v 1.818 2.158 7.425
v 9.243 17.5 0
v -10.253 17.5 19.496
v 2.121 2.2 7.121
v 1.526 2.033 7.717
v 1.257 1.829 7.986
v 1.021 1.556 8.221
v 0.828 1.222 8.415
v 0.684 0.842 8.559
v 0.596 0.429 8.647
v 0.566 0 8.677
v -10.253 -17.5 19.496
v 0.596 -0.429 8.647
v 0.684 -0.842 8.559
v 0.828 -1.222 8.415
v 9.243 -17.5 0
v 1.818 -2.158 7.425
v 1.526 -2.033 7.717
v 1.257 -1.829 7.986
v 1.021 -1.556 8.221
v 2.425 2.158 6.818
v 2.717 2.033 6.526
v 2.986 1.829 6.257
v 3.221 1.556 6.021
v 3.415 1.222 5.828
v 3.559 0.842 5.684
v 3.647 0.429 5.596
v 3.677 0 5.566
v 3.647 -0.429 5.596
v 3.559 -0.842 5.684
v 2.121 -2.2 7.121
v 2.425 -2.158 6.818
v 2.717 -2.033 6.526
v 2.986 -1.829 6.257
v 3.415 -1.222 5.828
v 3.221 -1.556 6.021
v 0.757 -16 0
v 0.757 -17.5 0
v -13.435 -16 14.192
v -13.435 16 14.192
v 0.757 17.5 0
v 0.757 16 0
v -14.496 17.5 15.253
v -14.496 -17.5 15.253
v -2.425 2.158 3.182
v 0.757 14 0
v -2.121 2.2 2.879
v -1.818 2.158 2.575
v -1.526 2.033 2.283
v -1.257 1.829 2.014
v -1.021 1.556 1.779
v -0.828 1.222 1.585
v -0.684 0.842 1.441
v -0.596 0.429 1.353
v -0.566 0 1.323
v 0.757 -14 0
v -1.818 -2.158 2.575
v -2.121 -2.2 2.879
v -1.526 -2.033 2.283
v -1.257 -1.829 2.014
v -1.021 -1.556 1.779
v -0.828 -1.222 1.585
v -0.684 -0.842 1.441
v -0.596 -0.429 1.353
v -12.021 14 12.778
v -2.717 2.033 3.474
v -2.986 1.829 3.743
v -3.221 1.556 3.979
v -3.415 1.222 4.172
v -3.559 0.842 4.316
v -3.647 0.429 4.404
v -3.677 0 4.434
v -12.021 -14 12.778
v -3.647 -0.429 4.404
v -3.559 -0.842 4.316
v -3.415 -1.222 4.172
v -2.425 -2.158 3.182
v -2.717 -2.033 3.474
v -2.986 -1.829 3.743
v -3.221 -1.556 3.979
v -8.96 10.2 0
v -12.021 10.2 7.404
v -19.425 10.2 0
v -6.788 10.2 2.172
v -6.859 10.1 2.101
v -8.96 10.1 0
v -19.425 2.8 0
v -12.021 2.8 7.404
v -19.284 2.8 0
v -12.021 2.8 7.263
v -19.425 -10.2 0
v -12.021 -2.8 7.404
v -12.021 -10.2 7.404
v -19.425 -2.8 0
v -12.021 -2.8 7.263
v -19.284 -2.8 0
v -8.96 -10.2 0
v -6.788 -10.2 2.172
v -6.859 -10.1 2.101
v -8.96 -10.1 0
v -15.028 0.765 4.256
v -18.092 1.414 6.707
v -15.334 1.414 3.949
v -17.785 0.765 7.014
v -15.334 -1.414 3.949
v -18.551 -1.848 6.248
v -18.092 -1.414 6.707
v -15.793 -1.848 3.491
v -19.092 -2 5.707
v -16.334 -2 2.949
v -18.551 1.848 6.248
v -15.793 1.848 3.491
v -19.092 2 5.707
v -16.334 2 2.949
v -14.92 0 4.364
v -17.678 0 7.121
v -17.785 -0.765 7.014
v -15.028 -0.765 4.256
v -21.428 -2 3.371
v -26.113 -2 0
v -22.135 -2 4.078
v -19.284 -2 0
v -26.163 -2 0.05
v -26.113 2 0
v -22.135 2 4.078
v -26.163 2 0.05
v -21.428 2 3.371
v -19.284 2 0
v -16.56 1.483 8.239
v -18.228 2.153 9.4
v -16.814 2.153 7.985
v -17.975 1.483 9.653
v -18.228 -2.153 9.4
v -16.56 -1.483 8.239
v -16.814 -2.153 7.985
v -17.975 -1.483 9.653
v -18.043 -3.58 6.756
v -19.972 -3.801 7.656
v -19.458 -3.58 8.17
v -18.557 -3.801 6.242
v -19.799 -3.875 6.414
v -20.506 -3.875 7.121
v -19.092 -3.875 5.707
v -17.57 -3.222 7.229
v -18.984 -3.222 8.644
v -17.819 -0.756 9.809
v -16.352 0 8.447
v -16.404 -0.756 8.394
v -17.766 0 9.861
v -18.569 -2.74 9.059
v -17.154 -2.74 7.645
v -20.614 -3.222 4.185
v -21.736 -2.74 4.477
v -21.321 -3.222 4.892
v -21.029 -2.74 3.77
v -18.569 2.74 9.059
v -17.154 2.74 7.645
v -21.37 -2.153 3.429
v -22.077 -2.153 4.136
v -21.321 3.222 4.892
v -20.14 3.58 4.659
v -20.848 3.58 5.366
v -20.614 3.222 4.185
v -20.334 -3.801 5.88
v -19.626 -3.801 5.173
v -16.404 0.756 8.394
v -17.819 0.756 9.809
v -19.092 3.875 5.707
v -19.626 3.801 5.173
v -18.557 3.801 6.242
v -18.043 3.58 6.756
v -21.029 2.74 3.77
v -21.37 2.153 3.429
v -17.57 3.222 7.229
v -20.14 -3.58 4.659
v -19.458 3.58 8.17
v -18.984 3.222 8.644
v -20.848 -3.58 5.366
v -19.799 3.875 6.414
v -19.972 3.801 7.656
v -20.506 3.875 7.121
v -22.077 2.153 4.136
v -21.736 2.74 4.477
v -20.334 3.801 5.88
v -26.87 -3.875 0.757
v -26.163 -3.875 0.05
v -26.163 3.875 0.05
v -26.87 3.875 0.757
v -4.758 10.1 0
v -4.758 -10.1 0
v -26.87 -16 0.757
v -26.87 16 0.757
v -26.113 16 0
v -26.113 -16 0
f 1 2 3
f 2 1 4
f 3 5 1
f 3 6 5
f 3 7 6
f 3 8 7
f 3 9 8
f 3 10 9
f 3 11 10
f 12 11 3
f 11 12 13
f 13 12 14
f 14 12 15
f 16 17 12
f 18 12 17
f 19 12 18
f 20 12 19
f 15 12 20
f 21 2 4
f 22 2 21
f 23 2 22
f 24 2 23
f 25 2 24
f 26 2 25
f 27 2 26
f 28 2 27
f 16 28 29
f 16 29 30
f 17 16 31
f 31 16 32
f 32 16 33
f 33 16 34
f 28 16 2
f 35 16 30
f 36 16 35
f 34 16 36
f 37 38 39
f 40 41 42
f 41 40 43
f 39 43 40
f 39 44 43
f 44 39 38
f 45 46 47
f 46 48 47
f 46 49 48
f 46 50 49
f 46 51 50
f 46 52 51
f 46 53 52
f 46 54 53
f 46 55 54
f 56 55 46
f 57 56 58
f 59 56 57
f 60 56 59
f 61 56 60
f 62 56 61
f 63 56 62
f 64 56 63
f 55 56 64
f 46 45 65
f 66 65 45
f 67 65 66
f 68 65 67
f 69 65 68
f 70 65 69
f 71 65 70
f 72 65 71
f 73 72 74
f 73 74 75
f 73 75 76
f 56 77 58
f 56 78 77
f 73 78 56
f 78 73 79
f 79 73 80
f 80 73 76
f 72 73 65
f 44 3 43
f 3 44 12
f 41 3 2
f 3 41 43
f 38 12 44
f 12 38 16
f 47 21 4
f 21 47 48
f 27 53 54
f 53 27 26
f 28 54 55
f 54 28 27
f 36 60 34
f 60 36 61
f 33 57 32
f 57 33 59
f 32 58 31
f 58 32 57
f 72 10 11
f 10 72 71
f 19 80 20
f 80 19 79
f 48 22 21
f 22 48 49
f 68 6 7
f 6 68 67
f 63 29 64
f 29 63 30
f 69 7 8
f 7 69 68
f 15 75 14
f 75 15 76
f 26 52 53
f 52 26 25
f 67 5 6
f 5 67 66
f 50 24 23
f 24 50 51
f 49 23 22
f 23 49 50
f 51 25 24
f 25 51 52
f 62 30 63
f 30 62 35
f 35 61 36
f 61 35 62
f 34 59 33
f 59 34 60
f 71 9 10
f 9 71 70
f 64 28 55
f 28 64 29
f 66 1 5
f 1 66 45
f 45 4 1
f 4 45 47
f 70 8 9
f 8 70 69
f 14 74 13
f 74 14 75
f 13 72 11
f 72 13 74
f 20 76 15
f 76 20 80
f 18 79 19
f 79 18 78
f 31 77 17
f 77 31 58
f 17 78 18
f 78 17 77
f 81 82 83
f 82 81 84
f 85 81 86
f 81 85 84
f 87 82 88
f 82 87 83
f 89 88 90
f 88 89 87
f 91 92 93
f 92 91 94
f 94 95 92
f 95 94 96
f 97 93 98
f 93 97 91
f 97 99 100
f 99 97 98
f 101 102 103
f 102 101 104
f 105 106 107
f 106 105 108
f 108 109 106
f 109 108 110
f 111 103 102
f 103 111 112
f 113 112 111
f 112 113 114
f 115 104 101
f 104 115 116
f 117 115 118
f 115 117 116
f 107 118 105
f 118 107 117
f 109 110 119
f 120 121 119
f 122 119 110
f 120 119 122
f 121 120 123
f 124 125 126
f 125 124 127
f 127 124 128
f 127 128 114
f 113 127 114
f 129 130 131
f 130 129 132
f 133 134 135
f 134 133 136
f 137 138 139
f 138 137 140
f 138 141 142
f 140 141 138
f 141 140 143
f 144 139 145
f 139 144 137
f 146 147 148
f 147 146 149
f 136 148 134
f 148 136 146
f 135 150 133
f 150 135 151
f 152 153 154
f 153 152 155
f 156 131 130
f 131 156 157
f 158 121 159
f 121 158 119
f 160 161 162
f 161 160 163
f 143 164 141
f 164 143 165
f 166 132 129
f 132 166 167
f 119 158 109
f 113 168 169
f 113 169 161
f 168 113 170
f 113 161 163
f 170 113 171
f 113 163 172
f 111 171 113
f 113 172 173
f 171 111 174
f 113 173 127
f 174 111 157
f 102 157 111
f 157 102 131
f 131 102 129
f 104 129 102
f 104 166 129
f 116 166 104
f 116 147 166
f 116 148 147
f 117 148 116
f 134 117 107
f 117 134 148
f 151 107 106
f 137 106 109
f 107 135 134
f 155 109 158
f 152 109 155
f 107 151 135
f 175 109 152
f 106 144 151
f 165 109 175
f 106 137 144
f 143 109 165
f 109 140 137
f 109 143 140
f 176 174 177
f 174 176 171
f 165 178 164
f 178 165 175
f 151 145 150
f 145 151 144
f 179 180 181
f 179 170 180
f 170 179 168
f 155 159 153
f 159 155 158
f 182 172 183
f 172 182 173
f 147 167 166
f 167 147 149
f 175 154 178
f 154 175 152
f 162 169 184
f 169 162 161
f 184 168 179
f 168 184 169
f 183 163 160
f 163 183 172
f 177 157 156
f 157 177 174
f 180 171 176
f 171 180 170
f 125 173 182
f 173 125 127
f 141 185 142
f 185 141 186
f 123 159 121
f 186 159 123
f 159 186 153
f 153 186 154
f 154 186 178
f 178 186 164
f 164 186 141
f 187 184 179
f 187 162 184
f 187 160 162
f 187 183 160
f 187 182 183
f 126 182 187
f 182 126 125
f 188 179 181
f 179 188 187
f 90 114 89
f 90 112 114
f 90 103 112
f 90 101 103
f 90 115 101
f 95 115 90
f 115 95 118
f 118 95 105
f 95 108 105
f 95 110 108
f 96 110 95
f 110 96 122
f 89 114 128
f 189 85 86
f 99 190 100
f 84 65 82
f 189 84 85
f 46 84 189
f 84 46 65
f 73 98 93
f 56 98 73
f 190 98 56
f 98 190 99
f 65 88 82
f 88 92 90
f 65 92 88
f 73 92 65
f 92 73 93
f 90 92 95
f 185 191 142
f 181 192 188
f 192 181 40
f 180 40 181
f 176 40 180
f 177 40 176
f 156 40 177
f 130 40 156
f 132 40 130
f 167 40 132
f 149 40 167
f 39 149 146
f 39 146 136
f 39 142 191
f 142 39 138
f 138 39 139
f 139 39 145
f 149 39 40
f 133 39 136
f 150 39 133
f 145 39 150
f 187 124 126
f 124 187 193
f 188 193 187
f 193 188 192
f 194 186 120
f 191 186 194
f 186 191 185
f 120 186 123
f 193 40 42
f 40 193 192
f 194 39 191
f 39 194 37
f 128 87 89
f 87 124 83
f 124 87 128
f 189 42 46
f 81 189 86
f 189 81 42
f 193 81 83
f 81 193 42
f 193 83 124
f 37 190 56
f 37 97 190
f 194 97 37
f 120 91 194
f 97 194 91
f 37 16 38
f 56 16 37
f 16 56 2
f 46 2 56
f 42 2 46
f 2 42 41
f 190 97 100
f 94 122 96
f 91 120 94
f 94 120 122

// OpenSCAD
// Generated by SolidPython 1.1.3 on 2024-01-15 01:37:30


difference() {
	translate(v = [0, 0, 5]) {
		rotate(a = 45, v = [0, 1, 0]) {
			union() {
				difference() {
					cube(center = true, size = [35, 35, 6]);
					cylinder($fn = 32, center = true, h = 20, r = 2.2000000000);
				}
				translate(v = [0, 0, -12]) {
					rotate(a = 90, v = [0, 1, 0]) {
						difference() {
							union() {
								union();
								translate(v = [-10, 0, 0]) {
									rotate(a = [0, 90.0, 0.0]) {
										translate(v = [0, 0, 10.0]) {
											cube(center = true, size = [32.0000000000, 32.0000000000, 20.0]);
										}
									}
								}
								union();
							}
							union() {
								union();
								translate(v = [-10, 0, 0]) {
									rotate(a = [0, 90.0, 0.0]) {
										translate(v = [0, 0, 10]) {
											rotate(a = -90, v = [0, -1, 0]) {
												rotate(a = 90, v = [0, 0, 1]) {
													union() {
														union();
														translate(v = [0, -10, 0]) {
															rotate(a = -90, v = [1, 0, 0]) {
																polyhedron(convexity = 10, faces = [[0, 1, 4], [1, 5, 4], [1, 2, 5], [2, 6, 5], [2, 3, 6], [3, 7, 6], [3, 0, 7], [0, 4, 7], [3, 2, 1, 0], [4, 5, 6, 7]], points = [[-15.0000000000, 15.0000000000, 0.0000000000], [15.0000000000, 15.0000000000, 0.0000000000], [15.0000000000, -15.0000000000, 0.0000000000], [-15.0000000000, -15.0000000000, 0.0000000000], [0.0000000000, 0.0000000000, 15.0000000000], [0.0000000000, 0.0000000000, 15.0000000000], [0.0000000000, 0.0000000000, 15.0000000000], [0.0000000000, 0.0000000000, 15.0000000000]]);
															}
														}
														translate(v = [0, 1.0, 0]) {
															rotate(a = 180, v = [1, 0, 0]) {
																translate(v = [0, -10, 0]) {
																	rotate(a = -90, v = [1, 0, 0]) {
																		polyhedron(convexity = 10, faces = [[0, 1, 4], [1, 5, 4], [1, 2, 5], [2, 6, 5], [2, 3, 6], [3, 7, 6], [3, 0, 7], [0, 4, 7], [3, 2, 1, 0], [4, 5, 6, 7]], points = [[-15.0000000000, 15.0000000000, 0.0000000000], [15.0000000000, 15.0000000000, 0.0000000000], [15.0000000000, -15.0000000000, 0.0000000000], [-15.0000000000, -15.0000000000, 0.0000000000], [0.0000000000, 0.0000000000, 15.0000000000], [0.0000000000, 0.0000000000, 15.0000000000], [0.0000000000, 0.0000000000, 15.0000000000], [0.0000000000, 0.0000000000, 15.0000000000]]);
																	}
																}
															}
														}
														translate(v = [0, -10, 0]) {
															rotate(a = -90, v = [1, 0, 0]) {
																union() {
																	polyhedron(convexity = 10, faces = [[0, 1, 5], [1, 6, 5], [1, 2, 6], [2, 7, 6], [2, 3, 7], [3, 8, 7], [3, 4, 8], [4, 9, 8], [4, 0, 9], [0, 5, 9], [4, 3, 2, 1, 0], [5, 6, 7, 8, 9]], points = [[-10.2, 10.2, 0.0], [-10.2, 2.8, 0.0], [-4.3999999999999995, 2.8, 0.0], [-4.3999999999999995, 0.0, 0.0], [0.0, 0.0, 0.0], [-10.2, 10.2, 20.0], [-10.2, 2.8, 20.0], [-4.3999999999999995, 2.8, 20.0], [-4.3999999999999995, 0.0, 20.0], [0.0, 0.0, 20.0]]);
																	mirror(v = [0, 1]) {
																		polyhedron(convexity = 10, faces = [[0, 1, 5], [1, 6, 5], [1, 2, 6], [2, 7, 6], [2, 3, 7], [3, 8, 7], [3, 4, 8], [4, 9, 8], [4, 0, 9], [0, 5, 9], [4, 3, 2, 1, 0], [5, 6, 7, 8, 9]], points = [[-10.2, 10.2, 0.0], [-10.2, 2.8, 0.0], [-4.3999999999999995, 2.8, 0.0], [-4.3999999999999995, 0.0, 0.0], [0.0, 0.0, 0.0], [-10.2, 10.2, 20.0], [-10.2, 2.8, 20.0], [-4.3999999999999995, 2.8, 20.0], [-4.3999999999999995, 0.0, 20.0], [0.0, 0.0, 20.0]]);
																	}
																	mirror(v = [1, 1]) {
																		union() {
																			polyhedron(convexity = 10, faces = [[0, 1, 5], [1, 6, 5], [1, 2, 6], [2, 7, 6], [2, 3, 7], [3, 8, 7], [3, 4, 8], [4, 9, 8], [4, 0, 9], [0, 5, 9], [4, 3, 2, 1, 0], [5, 6, 7, 8, 9]], points = [[-10.2, 10.2, 0.0], [-10.2, 2.8, 0.0], [-4.3999999999999995, 2.8, 0.0], [-4.3999999999999995, 0.0, 0.0], [0.0, 0.0, 0.0], [-10.2, 10.2, 20.0], [-10.2, 2.8, 20.0], [-4.3999999999999995, 2.8, 20.0], [-4.3999999999999995, 0.0, 20.0], [0.0, 0.0, 20.0]]);
																			mirror(v = [0, 1]) {
																				polyhedron(convexity = 10, faces = [[0, 1, 5], [1, 6, 5], [1, 2, 6], [2, 7, 6], [2, 3, 7], [3, 8, 7], [3, 4, 8], [4, 9, 8], [4, 0, 9], [0, 5, 9], [4, 3, 2, 1, 0], [5, 6, 7, 8, 9]], points = [[-10.2, 10.2, 0.0], [-10.2, 2.8, 0.0], [-4.3999999999999995, 2.8, 0.0], [-4.3999999999999995, 0.0, 0.0], [0.0, 0.0, 0.0], [-10.2, 10.2, 20.0], [-10.2, 2.8, 20.0], [-4.3999999999999995, 2.8, 20.0], [-4.3999999999999995, 0.0, 20.0], [0.0, 0.0, 20.0]]);
																			}
																		}
																	}
																	mirror(v = [1, -1]) {
																		union() {
																			polyhedron(convexity = 10, faces = [[0, 1, 5], [1, 6, 5], [1, 2, 6], [2, 7, 6], [2, 3, 7], [3, 8, 7], [3, 4, 8], [4, 9, 8], [4, 0, 9], [0, 5, 9], [4, 3, 2, 1, 0], [5, 6, 7, 8, 9]], points = [[-10.2, 10.2, 0.0], [-10.2, 2.8, 0.0], [-4.3999999999999995, 2.8, 0.0], [-4.3999999999999995, 0.0, 0.0], [0.0, 0.0, 0.0], [-10.2, 10.2, 20.0], [-10.2, 2.8, 20.0], [-4.3999999999999995, 2.8, 20.0], [-4.3999999999999995, 0.0, 20.0], [0.0, 0.0, 20.0]]);
																			mirror(v = [0, 1]) {
																				polyhedron(convexity = 10, faces = [[0, 1, 5], [1, 6, 5], [1, 2, 6], [2, 7, 6], [2, 3, 7], [3, 8, 7], [3, 4, 8], [4, 9, 8], [4, 0, 9], [0, 5, 9], [4, 3, 2, 1, 0], [5, 6, 7, 8, 9]], points = [[-10.2, 10.2, 0.0], [-10.2, 2.8, 0.0], [-4.3999999999999995, 2.8, 0.0], [-4.3999999999999995, 0.0, 0.0], [0.0, 0.0, 0.0], [-10.2, 10.2, 20.0], [-10.2, 2.8, 20.0], [-4.3999999999999995, 2.8, 20.0], [-4.3999999999999995, 0.0, 20.0], [0.0, 0.0, 20.0]]);
																			}
																			mirror(v = [1, 1]) {
																				union() {
																					polyhedron(convexity = 10, faces = [[0, 1, 5], [1, 6, 5], [1, 2, 6], [2, 7, 6], [2, 3, 7], [3, 8, 7], [3, 4, 8], [4, 9, 8], [4, 0, 9], [0, 5, 9], [4, 3, 2, 1, 0], [5, 6, 7, 8, 9]], points = [[-10.2, 10.2, 0.0], [-10.2, 2.8, 0.0], [-4.3999999999999995, 2.8, 0.0], [-4.3999999999999995, 0.0, 0.0], [0.0, 0.0, 0.0], [-10.2, 10.2, 20.0], [-10.2, 2.8, 20.0], [-4.3999999999999995, 2.8, 20.0], [-4.3999999999999995, 0.0, 20.0], [0.0, 0.0, 20.0]]);
																					mirror(v = [0, 1]) {
																						polyhedron(convexity = 10, faces = [[0, 1, 5], [1, 6, 5], [1, 2, 6], [2, 7, 6], [2, 3, 7], [3, 8, 7], [3, 4, 8], [4, 9, 8], [4, 0, 9], [0, 5, 9], [4, 3, 2, 1, 0], [5, 6, 7, 8, 9]], points = [[-10.2, 10.2, 0.0], [-10.2, 2.8, 0.0], [-4.3999999999999995, 2.8, 0.0], [-4.3999999999999995, 0.0, 0.0], [0.0, 0.0, 0.0], [-10.2, 10.2, 20.0], [-10.2, 2.8, 20.0], [-4.3999999999999995, 2.8, 20.0], [-4.3999999999999995, 0.0, 20.0], [0.0, 0.0, 20.0]]);
																					}
																				}
																			}
																		}
																	}
																}
															}
														}
														union() {
															union();
															translate(v = [0, 1.0, 0]) {
																rotate(a = 180, v = [1, 0, 0]) {
																	rotate(a = 180, v = [0, 1, 0]) {
																		union() {
																			translate(v = [0, 0, 14]) {
																				cylinder($fn = 32, h = 4, r = 3.8750000000);
																			}
																			translate(v = [-3.8750000000, -12, 15]) {
																				cube(size = [7.7500000000, 12, 4]);
																			}
																			union() {
																				cylinder($fn = 16, h = 19, r = 2.0000000000);
																				translate(v = [-2.0000000000, -12, 0]) {
																					cube(size = [4, 12, 19]);
																				}
																			}
																			rotate(a = -90, v = [0, 1, 0]) {
																				polyhedron(convexity = 10, faces = [[0, 1, 3], [1, 4, 3], [1, 2, 4], [2, 5, 4], [2, 0, 5], [0, 3, 5], [2, 1, 0], [3, 4, 5]], points = [[0.0000000000, -10.0000000000, 0.0000000000], [10.1000000000, -10.0000000000, 10.1000000000], [10.1000000000, -10.0000000000, -10.1000000000], [0.0000000000, 12.0000000000, 0.0000000000], [10.1000000000, 12.0000000000, 10.1000000000], [10.1000000000, 12.0000000000, -10.1000000000]]);
																			}
																		}
																	}
																}
															}
															translate(v = [0, 1.0, 0]) {
																rotate(a = 180, v = [1, 0, 0]) {
																	rotate(a = 90, v = [0, 1, 0]) {
																		union() {
																			translate(v = [0, 0, 14]) {
																				cylinder($fn = 32, h = 4, r = 3.8750000000);
																			}
																			translate(v = [-3.8750000000, -12, 15]) {
																				cube(size = [7.7500000000, 12, 4]);
																			}
																			union() {
																				cylinder($fn = 16, h = 19, r = 2.0000000000);
																				translate(v = [-2.0000000000, -12, 0]) {
																					cube(size = [4, 12, 19]);
																				}
																			}
																			rotate(a = -90, v = [0, 1, 0]) {
																				polyhedron(convexity = 10, faces = [[0, 1, 3], [1, 4, 3], [1, 2, 4], [2, 5, 4], [2, 0, 5], [0, 3, 5], [2, 1, 0], [3, 4, 5]], points = [[0.0000000000, -10.0000000000, 0.0000000000], [10.1000000000, -10.0000000000, 10.1000000000], [10.1000000000, -10.0000000000, -10.1000000000], [0.0000000000, 12.0000000000, 0.0000000000], [10.1000000000, 12.0000000000, 10.1000000000], [10.1000000000, 12.0000000000, -10.1000000000]]);
																			}
																		}
																	}
																}
															}
															translate(v = [0, 1.0, 0]) {
																rotate(a = 180, v = [1, 0, 0]) {
																	union() {
																		translate(v = [0, 0, 14]) {
																			cylinder($fn = 32, h = 4, r = 3.8750000000);
																		}
																		translate(v = [-3.8750000000, -12, 15]) {
																			cube(size = [7.7500000000, 12, 4]);
																		}
																		union() {
																			cylinder($fn = 16, h = 19, r = 2.0000000000);
																			translate(v = [-2.0000000000, -12, 0]) {
																				cube(size = [4, 12, 19]);
																			}
																		}
																		rotate(a = -90, v = [0, 1, 0]) {
																			polyhedron(convexity = 10, faces = [[0, 1, 3], [1, 4, 3], [1, 2, 4], [2, 5, 4], [2, 0, 5], [0, 3, 5], [2, 1, 0], [3, 4, 5]], points = [[0.0000000000, -10.0000000000, 0.0000000000], [10.1000000000, -10.0000000000, 10.1000000000], [10.1000000000, -10.0000000000, -10.1000000000], [0.0000000000, 12.0000000000, 0.0000000000], [10.1000000000, 12.0000000000, 10.1000000000], [10.1000000000, 12.0000000000, -10.1000000000]]);
																		}
																	}
																}
															}
															translate(v = [0, 1.0, 0]) {
																rotate(a = 180, v = [1, 0, 0]) {
																	rotate(a = 270, v = [0, 1, 0]) {
																		union() {
																			translate(v = [0, 0, 14]) {
																				cylinder($fn = 32, h = 4, r = 3.8750000000);
																			}
																			translate(v = [-3.8750000000, -12, 15]) {
																				cube(size = [7.7500000000, 12, 4]);
																			}
																			union() {
																				cylinder($fn = 16, h = 19, r = 2.0000000000);
																				translate(v = [-2.0000000000, -12, 0]) {
																					cube(size = [4, 12, 19]);
																				}
																			}
																			rotate(a = -90, v = [0, 1, 0]) {
																				polyhedron(convexity = 10, faces = [[0, 1, 3], [1, 4, 3], [1, 2, 4], [2, 5, 4], [2, 0, 5], [0, 3, 5], [2, 1, 0], [3, 4, 5]], points = [[0.0000000000, -10.0000000000, 0.0000000000], [10.1000000000, -10.0000000000, 10.1000000000], [10.1000000000, -10.0000000000, -10.1000000000], [0.0000000000, 12.0000000000, 0.0000000000], [10.1000000000, 12.0000000000, 10.1000000000], [10.1000000000, 12.0000000000, -10.1000000000]]);
																			}
																		}
																	}
																}
															}
														}
													}
												}
											}
										}
									}
								}
							}
						}
					}
				}
			}
		}
	}
	translate(v = [0, 0, -150]) {
		cube(center = true, size = [300, 300, 300]);
	}
}
/***********************************************
*********      SolidPython code:      **********
************************************************
 
#! /usr/bin/env python3
import sys
from math import cos, radians, sin, pi, tau
from pathlib import Path

from solid import *
from solid.utils import *

from typing import Set, Sequence, List, Callable, Optional, Union, Iterable, Tuple

import numpy as np

import extrusion_fittings as ef

class ClipMount():
	def __init__(self,clip_size = 35,screw_dia = 4.4, mount_thick = 6):
		self.clip_size = clip_size
		self.screw_dia = screw_dia
		self.mount_thick = mount_thick

	def screws(self) -> OpenSCADObject:
		screw = cylinder(r=self.screw_dia/2, h=20, segments = 32, center=True)
		return screw

	def clip_mount(self) -> OpenSCADObject:
		mm = cube([self.clip_size,self.clip_size,self.mount_thick], center=True)
		mm -= self.screws()
		return mm

	def bisect_floor(self,input) -> OpenSCADObject:
		size = 300
		floor = translate([0,0,-150])(cube([300,300,300],center = True))
		return input - floor


if __name__ == "__main__":
	out_dir = sys.argv[1] if len(sys.argv) > 1 else Path(__file__).parent

	e = ef.Fittings(10)
	m = ClipMount()
	a = m.clip_mount()
	t = e.one_end_tube()
	t = rotate(a = 90,v = (0,1,0))(t)
	# t = translate([-53,0,-30])(t)
	t = translate([0,0,-12])(t)
	a += t
	a = rotate(a = 45, v = (0,1,0))(a)
	a = translate([0,0,5])(a)
	a = m.bisect_floor(a)

	file_out = scad_render_to_file(a,  out_dir=out_dir, include_orig_code=True)
	print(f"{__file__}: SCAD file written to: \n{file_out}")
 
 
************************************************/
